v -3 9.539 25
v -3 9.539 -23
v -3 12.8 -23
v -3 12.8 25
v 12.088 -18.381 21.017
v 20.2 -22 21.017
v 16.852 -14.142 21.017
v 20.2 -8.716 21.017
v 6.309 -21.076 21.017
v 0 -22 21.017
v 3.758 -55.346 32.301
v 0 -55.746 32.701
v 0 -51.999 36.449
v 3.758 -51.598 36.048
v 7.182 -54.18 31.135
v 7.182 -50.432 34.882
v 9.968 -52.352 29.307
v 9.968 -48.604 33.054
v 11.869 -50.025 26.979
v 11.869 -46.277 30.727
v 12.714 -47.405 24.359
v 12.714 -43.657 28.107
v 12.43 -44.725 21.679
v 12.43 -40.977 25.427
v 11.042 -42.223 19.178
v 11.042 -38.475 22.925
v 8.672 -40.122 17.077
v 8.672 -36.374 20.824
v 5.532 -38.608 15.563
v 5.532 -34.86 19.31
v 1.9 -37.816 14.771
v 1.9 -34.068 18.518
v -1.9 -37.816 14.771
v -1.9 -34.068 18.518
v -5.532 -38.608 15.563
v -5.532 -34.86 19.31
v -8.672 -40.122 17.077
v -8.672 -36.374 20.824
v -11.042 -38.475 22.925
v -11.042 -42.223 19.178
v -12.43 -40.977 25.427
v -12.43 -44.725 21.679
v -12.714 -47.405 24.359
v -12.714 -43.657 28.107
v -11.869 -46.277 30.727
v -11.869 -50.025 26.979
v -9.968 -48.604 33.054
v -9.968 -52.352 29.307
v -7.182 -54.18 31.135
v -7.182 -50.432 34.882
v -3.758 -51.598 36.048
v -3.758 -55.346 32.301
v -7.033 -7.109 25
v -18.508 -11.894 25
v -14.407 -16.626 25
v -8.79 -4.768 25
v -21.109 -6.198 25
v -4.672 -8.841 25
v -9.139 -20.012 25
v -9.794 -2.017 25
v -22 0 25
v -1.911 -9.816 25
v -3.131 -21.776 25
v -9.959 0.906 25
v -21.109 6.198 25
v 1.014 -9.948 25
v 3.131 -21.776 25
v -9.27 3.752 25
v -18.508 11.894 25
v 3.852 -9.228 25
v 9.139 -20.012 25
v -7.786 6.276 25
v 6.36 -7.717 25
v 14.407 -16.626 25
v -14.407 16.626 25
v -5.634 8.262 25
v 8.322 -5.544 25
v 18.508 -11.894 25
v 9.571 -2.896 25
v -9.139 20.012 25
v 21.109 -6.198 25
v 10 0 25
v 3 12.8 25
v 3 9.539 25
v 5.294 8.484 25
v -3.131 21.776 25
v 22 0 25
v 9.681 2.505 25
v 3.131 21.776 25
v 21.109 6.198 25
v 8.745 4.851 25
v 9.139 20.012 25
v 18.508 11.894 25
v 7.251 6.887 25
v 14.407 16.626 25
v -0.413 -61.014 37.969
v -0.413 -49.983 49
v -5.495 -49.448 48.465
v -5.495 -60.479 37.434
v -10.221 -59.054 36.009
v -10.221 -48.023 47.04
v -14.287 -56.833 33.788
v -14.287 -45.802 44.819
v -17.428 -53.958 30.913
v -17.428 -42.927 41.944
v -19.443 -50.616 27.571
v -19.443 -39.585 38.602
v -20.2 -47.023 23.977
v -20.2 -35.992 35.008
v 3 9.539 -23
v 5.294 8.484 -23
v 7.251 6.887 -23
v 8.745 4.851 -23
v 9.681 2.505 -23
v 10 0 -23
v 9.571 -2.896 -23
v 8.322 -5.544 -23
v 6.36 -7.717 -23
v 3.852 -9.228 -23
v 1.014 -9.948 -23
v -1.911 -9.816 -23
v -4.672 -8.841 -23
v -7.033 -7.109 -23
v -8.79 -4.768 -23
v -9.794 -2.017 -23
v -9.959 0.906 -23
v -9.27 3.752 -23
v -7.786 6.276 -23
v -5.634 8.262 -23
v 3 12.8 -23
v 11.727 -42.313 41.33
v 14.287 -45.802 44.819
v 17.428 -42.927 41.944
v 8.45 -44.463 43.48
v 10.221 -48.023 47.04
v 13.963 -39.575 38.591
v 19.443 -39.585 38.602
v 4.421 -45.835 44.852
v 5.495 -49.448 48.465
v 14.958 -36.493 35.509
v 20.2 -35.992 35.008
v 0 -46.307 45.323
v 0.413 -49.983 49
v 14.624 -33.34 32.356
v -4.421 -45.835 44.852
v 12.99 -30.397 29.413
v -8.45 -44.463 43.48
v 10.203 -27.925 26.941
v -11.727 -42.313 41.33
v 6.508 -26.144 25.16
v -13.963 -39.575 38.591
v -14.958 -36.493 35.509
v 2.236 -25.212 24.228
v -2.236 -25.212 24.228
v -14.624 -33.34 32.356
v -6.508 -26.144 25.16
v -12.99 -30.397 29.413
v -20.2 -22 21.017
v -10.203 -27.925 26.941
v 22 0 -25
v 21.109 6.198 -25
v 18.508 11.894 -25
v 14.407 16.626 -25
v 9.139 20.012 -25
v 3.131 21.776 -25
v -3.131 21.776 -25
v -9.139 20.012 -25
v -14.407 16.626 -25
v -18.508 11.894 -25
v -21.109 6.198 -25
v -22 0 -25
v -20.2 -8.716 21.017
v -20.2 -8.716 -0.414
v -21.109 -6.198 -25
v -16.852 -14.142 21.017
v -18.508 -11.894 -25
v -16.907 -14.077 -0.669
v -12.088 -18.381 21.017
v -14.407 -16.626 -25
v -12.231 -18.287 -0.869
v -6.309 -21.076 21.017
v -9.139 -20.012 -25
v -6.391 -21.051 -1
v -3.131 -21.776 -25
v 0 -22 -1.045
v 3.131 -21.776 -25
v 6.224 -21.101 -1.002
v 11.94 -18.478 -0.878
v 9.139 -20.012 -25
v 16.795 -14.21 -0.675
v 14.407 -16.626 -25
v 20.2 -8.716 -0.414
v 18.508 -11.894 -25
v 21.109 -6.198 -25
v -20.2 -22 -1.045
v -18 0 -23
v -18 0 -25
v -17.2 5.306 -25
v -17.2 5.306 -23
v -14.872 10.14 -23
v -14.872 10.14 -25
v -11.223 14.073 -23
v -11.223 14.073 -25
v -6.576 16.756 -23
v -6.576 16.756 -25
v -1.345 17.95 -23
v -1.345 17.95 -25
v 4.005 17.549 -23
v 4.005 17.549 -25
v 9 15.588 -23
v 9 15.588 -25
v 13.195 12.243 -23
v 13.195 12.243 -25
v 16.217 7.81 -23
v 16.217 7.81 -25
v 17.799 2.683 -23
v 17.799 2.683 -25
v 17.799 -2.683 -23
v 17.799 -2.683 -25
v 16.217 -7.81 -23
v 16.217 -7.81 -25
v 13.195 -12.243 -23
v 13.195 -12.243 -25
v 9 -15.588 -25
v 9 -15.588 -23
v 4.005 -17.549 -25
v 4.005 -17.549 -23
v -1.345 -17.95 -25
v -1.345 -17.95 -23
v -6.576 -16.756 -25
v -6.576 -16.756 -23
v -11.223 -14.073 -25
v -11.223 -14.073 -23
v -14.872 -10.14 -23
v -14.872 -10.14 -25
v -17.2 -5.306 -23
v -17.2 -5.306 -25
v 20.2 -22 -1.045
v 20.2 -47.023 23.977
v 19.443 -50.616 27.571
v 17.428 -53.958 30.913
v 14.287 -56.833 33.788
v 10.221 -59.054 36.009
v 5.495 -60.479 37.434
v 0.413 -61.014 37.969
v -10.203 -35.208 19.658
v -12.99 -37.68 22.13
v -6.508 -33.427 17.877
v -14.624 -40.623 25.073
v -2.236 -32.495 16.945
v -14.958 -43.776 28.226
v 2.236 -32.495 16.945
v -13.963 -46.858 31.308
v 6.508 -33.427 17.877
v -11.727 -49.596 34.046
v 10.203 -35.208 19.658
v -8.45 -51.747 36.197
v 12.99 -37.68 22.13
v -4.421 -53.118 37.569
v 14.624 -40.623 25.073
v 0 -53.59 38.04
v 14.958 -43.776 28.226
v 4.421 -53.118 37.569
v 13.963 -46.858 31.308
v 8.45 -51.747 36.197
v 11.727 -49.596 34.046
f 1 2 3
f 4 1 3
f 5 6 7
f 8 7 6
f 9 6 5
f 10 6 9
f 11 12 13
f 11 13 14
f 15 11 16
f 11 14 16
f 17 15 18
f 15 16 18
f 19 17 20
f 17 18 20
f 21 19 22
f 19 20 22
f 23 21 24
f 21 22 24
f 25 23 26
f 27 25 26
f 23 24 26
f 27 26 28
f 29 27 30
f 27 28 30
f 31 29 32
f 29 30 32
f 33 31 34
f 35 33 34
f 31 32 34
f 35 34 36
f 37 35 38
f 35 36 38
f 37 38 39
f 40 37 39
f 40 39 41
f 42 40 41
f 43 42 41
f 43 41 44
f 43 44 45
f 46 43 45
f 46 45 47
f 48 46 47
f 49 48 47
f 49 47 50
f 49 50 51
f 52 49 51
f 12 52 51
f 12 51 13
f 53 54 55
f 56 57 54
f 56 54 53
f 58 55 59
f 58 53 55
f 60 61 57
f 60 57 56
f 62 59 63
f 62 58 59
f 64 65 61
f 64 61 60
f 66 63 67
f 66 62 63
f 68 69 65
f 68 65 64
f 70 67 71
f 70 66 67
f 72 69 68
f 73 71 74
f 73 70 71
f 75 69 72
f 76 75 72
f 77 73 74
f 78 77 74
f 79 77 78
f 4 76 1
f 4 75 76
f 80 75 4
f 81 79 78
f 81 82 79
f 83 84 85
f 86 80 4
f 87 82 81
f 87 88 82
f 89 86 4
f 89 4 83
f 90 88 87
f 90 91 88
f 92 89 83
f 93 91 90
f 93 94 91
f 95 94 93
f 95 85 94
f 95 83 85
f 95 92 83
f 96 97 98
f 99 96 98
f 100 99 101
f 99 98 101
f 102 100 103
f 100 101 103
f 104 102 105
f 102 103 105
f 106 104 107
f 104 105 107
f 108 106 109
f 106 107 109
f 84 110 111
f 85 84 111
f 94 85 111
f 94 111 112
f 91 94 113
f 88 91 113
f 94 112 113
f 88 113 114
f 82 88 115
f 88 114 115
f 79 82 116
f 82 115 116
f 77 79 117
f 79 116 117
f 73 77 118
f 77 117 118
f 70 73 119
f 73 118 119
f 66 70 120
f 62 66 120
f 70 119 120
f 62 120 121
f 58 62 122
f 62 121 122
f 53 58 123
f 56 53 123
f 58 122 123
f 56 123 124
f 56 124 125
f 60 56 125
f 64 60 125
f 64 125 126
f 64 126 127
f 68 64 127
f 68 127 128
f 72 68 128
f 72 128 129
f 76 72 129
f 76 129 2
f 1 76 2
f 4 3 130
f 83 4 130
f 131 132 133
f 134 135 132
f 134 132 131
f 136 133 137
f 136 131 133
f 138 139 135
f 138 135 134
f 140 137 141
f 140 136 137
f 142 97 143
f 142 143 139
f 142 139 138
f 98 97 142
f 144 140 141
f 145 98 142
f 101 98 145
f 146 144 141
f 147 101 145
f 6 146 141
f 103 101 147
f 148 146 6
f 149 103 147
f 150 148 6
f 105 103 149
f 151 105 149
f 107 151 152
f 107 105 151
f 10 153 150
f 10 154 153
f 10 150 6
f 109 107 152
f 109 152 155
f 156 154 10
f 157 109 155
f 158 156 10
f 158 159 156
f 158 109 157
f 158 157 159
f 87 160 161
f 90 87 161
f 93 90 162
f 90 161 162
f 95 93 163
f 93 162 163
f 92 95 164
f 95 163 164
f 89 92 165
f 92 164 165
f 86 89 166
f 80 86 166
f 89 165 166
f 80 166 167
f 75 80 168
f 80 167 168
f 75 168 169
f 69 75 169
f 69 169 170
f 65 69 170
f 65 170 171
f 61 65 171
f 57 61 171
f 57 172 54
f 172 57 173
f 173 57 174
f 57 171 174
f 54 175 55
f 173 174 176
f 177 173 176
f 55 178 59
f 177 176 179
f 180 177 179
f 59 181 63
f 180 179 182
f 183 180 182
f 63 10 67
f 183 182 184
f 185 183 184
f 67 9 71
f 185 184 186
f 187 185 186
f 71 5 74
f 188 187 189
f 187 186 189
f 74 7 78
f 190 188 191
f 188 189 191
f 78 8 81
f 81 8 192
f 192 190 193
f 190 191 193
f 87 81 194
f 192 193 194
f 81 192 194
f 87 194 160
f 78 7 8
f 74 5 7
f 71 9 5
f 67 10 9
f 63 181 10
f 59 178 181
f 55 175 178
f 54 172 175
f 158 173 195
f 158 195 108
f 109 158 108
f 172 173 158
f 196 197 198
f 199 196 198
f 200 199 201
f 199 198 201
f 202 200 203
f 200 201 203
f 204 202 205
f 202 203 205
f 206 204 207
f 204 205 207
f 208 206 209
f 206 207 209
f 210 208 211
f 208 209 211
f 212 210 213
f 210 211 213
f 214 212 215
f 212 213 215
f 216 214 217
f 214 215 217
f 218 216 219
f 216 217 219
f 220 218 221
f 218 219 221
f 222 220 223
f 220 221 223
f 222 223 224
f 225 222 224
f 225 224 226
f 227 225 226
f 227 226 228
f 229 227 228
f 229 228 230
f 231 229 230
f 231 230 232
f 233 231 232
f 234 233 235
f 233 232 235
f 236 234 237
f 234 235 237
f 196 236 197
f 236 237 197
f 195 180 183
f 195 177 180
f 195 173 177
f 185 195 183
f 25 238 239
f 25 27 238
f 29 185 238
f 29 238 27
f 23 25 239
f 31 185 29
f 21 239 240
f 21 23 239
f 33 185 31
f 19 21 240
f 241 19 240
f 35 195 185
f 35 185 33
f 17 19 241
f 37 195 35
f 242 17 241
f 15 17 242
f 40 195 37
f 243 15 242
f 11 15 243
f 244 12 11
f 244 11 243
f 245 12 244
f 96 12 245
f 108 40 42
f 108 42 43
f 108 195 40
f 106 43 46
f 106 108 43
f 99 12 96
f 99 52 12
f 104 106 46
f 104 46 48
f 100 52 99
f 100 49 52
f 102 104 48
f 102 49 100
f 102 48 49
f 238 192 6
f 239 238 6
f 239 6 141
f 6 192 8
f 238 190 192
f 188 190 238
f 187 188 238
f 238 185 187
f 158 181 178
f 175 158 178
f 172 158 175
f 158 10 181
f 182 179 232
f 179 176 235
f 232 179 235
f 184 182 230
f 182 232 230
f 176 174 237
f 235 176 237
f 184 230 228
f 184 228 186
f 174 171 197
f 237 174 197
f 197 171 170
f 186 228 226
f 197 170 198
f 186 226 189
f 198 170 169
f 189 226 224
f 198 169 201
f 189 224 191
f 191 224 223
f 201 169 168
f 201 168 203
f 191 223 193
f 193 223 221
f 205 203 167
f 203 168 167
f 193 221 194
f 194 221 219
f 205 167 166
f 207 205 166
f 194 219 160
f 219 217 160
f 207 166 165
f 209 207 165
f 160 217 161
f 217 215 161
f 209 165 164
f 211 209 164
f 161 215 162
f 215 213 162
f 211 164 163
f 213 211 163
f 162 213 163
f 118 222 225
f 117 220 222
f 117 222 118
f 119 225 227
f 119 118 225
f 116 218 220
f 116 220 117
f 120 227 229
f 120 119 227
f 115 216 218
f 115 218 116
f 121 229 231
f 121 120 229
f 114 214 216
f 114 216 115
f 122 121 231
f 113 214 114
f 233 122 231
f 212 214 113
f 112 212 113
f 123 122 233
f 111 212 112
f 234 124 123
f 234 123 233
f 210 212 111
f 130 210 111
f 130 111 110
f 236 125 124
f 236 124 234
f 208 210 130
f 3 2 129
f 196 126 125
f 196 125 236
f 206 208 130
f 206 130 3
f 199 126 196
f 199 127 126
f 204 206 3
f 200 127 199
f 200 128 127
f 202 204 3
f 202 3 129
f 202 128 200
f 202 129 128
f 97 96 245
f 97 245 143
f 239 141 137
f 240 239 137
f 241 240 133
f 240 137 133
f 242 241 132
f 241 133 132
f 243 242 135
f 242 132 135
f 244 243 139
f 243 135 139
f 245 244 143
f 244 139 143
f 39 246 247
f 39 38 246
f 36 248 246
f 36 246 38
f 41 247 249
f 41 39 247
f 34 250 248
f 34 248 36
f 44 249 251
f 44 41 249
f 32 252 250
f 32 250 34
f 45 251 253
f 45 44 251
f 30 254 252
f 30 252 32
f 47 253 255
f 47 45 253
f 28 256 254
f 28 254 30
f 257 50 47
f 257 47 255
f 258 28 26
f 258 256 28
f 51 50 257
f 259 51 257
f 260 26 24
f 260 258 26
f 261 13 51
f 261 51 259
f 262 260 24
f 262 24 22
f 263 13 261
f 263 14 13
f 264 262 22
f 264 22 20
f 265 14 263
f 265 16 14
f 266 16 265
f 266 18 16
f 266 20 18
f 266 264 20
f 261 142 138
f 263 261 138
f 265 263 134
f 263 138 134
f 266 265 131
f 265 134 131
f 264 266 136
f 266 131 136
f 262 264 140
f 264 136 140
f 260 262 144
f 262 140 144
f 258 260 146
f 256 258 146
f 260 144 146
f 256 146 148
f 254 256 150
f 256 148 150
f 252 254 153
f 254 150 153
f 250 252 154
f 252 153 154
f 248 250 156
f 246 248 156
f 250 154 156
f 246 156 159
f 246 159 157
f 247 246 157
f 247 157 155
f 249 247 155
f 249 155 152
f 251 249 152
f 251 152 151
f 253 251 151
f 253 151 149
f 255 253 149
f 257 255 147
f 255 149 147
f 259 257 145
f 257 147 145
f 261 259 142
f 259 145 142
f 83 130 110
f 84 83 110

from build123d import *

# Parameters (mm, degrees)
BOSS_EXTRU_1_DEPTH      = 25
BOSS_EXTRU_1_DEPTH_BACK = 25
ESQUISSE1_R             = 22
BOSS_EXTRU_2_DEPTH      = 20.2
BOSS_EXTRU_2_DEPTH_BACK = 20.2
ESQUISSE5_R             = 15
ENL_V_MAT_EXTRU_1_DEPTH = 10.3
ESQUISSE7_R             = 12.75
ENL_V_MAT_EXTRU_3_DEPTH = 82.218329674
ESQUISSE8_R             = 10
ENL_V_MAT_EXTRU_4_DEPTH = 82.89474471
ESQUISSE9_R             = 18
ENL_V_MAT_EXTRU_5_DEPTH = 2
ENL_V_MAT_EXTRU_6_DEPTH = 82.218329674


with BuildPart() as part:
    # Esquisse1 → Boss.-Extru.1 (new, two sides: drawn at the far end of the back side and taken through both)
    with BuildSketch(Plane.XY.offset(-BOSS_EXTRU_1_DEPTH_BACK)):
        Circle(ESQUISSE1_R)
        with BuildLine():
            Line((-3, 9.539392014), (-3, 12.8))
            Line((-3, 12.8), (3, 12.8))
            Line((3, 12.8), (3, 9.539392014))
            ThreePointArc((3, 9.539392014), (8.062257748, 5.916079783), (10, 0))
            ThreePointArc((10, 0), (-5.916079783, -8.062257748), (-3, 9.539392014))
        make_face(mode=Mode.SUBTRACT)
    extrude(amount=BOSS_EXTRU_1_DEPTH + BOSS_EXTRU_1_DEPTH_BACK)

    # Esquisse4 → Boss.-Extru.2 (add, two sides: drawn at the far end of the back side and taken through both)
    with BuildSketch(Plane(origin=(0, 0, 0), x_dir=(0, 0, -1), z_dir=(1, 0, 0)).offset(-BOSS_EXTRU_2_DEPTH_BACK)):
        Polygon((1.045201898, -22), (-37.969134213, -61.014336111), (-49, -49.983470325), (-21.016529675, -22), (-21.016529675, 0), (0, 0), align=None)
    extrude(amount=BOSS_EXTRU_2_DEPTH + BOSS_EXTRU_2_DEPTH_BACK)

    # Esquisse5 → Enlèv. mat.-Extru.1 (cut)
    with BuildSketch(Plane(origin=(0, -0.491735162, -0.491735162), x_dir=(1, 0, 0), z_dir=(0, 0.7071067811865487, 0.7071067811865465))):
        with Locations((0, -49.791883092)):
            Circle(ESQUISSE5_R)
    extrude(amount=-ENL_V_MAT_EXTRU_1_DEPTH, mode=Mode.SUBTRACT)

    # Esquisse7 → Enlèv. mat.-Extru.3 (cut, through all)
    with BuildSketch(Plane(origin=(0, -0.491735162, -0.491735162), x_dir=(1, 0, 0), z_dir=(0, 0.7071067811865487, 0.7071067811865465))):
        with Locations((0, -49.791883092)):
            Circle(ESQUISSE7_R)
    extrude(amount=-ENL_V_MAT_EXTRU_3_DEPTH, mode=Mode.SUBTRACT)

    # Esquisse8 → Enlèv. mat.-Extru.4 (cut, through all)
    with BuildSketch(Plane.XY.offset(25)):
        Circle(ESQUISSE8_R)
    extrude(amount=-ENL_V_MAT_EXTRU_4_DEPTH, mode=Mode.SUBTRACT)

    # Esquisse9 → Enlèv. mat.-Extru.5 (cut)
    with BuildSketch(Plane(origin=(0, 0, -25), x_dir=(-1, 0, 0), z_dir=(0, 0, -1))):
        Circle(ESQUISSE9_R)
    extrude(amount=-ENL_V_MAT_EXTRU_5_DEPTH, mode=Mode.SUBTRACT)

    # Esquisse11 → Enlèv. mat.-Extru.6 (cut, through all)
    with BuildSketch(Plane(origin=(0, -0.491735162, -0.491735162), x_dir=(1, 0, 0), z_dir=(0, 0.7071067811865487, 0.7071067811865465))):
        with BuildLine():
            ThreePointArc((-0.412698372, -69.991883092), (-14.286537718, -64.07842081), (-20.2, -50.204581464))
            Line((-20.2, -50.204581464), (-20.2, -69.991883092))
            Line((-20.2, -69.991883092), (-0.412698372, -69.991883092))
        make_face()
        with BuildLine():
            ThreePointArc((20.2, -50.204581464), (14.286537718, -64.07842081), (0.412698372, -69.991883092))
            Line((0.412698372, -69.991883092), (20.2, -69.991883092))
            Line((20.2, -69.991883092), (20.2, -50.204581464))
        make_face()
    extrude(amount=-ENL_V_MAT_EXTRU_6_DEPTH, mode=Mode.SUBTRACT)


solid = part.part
